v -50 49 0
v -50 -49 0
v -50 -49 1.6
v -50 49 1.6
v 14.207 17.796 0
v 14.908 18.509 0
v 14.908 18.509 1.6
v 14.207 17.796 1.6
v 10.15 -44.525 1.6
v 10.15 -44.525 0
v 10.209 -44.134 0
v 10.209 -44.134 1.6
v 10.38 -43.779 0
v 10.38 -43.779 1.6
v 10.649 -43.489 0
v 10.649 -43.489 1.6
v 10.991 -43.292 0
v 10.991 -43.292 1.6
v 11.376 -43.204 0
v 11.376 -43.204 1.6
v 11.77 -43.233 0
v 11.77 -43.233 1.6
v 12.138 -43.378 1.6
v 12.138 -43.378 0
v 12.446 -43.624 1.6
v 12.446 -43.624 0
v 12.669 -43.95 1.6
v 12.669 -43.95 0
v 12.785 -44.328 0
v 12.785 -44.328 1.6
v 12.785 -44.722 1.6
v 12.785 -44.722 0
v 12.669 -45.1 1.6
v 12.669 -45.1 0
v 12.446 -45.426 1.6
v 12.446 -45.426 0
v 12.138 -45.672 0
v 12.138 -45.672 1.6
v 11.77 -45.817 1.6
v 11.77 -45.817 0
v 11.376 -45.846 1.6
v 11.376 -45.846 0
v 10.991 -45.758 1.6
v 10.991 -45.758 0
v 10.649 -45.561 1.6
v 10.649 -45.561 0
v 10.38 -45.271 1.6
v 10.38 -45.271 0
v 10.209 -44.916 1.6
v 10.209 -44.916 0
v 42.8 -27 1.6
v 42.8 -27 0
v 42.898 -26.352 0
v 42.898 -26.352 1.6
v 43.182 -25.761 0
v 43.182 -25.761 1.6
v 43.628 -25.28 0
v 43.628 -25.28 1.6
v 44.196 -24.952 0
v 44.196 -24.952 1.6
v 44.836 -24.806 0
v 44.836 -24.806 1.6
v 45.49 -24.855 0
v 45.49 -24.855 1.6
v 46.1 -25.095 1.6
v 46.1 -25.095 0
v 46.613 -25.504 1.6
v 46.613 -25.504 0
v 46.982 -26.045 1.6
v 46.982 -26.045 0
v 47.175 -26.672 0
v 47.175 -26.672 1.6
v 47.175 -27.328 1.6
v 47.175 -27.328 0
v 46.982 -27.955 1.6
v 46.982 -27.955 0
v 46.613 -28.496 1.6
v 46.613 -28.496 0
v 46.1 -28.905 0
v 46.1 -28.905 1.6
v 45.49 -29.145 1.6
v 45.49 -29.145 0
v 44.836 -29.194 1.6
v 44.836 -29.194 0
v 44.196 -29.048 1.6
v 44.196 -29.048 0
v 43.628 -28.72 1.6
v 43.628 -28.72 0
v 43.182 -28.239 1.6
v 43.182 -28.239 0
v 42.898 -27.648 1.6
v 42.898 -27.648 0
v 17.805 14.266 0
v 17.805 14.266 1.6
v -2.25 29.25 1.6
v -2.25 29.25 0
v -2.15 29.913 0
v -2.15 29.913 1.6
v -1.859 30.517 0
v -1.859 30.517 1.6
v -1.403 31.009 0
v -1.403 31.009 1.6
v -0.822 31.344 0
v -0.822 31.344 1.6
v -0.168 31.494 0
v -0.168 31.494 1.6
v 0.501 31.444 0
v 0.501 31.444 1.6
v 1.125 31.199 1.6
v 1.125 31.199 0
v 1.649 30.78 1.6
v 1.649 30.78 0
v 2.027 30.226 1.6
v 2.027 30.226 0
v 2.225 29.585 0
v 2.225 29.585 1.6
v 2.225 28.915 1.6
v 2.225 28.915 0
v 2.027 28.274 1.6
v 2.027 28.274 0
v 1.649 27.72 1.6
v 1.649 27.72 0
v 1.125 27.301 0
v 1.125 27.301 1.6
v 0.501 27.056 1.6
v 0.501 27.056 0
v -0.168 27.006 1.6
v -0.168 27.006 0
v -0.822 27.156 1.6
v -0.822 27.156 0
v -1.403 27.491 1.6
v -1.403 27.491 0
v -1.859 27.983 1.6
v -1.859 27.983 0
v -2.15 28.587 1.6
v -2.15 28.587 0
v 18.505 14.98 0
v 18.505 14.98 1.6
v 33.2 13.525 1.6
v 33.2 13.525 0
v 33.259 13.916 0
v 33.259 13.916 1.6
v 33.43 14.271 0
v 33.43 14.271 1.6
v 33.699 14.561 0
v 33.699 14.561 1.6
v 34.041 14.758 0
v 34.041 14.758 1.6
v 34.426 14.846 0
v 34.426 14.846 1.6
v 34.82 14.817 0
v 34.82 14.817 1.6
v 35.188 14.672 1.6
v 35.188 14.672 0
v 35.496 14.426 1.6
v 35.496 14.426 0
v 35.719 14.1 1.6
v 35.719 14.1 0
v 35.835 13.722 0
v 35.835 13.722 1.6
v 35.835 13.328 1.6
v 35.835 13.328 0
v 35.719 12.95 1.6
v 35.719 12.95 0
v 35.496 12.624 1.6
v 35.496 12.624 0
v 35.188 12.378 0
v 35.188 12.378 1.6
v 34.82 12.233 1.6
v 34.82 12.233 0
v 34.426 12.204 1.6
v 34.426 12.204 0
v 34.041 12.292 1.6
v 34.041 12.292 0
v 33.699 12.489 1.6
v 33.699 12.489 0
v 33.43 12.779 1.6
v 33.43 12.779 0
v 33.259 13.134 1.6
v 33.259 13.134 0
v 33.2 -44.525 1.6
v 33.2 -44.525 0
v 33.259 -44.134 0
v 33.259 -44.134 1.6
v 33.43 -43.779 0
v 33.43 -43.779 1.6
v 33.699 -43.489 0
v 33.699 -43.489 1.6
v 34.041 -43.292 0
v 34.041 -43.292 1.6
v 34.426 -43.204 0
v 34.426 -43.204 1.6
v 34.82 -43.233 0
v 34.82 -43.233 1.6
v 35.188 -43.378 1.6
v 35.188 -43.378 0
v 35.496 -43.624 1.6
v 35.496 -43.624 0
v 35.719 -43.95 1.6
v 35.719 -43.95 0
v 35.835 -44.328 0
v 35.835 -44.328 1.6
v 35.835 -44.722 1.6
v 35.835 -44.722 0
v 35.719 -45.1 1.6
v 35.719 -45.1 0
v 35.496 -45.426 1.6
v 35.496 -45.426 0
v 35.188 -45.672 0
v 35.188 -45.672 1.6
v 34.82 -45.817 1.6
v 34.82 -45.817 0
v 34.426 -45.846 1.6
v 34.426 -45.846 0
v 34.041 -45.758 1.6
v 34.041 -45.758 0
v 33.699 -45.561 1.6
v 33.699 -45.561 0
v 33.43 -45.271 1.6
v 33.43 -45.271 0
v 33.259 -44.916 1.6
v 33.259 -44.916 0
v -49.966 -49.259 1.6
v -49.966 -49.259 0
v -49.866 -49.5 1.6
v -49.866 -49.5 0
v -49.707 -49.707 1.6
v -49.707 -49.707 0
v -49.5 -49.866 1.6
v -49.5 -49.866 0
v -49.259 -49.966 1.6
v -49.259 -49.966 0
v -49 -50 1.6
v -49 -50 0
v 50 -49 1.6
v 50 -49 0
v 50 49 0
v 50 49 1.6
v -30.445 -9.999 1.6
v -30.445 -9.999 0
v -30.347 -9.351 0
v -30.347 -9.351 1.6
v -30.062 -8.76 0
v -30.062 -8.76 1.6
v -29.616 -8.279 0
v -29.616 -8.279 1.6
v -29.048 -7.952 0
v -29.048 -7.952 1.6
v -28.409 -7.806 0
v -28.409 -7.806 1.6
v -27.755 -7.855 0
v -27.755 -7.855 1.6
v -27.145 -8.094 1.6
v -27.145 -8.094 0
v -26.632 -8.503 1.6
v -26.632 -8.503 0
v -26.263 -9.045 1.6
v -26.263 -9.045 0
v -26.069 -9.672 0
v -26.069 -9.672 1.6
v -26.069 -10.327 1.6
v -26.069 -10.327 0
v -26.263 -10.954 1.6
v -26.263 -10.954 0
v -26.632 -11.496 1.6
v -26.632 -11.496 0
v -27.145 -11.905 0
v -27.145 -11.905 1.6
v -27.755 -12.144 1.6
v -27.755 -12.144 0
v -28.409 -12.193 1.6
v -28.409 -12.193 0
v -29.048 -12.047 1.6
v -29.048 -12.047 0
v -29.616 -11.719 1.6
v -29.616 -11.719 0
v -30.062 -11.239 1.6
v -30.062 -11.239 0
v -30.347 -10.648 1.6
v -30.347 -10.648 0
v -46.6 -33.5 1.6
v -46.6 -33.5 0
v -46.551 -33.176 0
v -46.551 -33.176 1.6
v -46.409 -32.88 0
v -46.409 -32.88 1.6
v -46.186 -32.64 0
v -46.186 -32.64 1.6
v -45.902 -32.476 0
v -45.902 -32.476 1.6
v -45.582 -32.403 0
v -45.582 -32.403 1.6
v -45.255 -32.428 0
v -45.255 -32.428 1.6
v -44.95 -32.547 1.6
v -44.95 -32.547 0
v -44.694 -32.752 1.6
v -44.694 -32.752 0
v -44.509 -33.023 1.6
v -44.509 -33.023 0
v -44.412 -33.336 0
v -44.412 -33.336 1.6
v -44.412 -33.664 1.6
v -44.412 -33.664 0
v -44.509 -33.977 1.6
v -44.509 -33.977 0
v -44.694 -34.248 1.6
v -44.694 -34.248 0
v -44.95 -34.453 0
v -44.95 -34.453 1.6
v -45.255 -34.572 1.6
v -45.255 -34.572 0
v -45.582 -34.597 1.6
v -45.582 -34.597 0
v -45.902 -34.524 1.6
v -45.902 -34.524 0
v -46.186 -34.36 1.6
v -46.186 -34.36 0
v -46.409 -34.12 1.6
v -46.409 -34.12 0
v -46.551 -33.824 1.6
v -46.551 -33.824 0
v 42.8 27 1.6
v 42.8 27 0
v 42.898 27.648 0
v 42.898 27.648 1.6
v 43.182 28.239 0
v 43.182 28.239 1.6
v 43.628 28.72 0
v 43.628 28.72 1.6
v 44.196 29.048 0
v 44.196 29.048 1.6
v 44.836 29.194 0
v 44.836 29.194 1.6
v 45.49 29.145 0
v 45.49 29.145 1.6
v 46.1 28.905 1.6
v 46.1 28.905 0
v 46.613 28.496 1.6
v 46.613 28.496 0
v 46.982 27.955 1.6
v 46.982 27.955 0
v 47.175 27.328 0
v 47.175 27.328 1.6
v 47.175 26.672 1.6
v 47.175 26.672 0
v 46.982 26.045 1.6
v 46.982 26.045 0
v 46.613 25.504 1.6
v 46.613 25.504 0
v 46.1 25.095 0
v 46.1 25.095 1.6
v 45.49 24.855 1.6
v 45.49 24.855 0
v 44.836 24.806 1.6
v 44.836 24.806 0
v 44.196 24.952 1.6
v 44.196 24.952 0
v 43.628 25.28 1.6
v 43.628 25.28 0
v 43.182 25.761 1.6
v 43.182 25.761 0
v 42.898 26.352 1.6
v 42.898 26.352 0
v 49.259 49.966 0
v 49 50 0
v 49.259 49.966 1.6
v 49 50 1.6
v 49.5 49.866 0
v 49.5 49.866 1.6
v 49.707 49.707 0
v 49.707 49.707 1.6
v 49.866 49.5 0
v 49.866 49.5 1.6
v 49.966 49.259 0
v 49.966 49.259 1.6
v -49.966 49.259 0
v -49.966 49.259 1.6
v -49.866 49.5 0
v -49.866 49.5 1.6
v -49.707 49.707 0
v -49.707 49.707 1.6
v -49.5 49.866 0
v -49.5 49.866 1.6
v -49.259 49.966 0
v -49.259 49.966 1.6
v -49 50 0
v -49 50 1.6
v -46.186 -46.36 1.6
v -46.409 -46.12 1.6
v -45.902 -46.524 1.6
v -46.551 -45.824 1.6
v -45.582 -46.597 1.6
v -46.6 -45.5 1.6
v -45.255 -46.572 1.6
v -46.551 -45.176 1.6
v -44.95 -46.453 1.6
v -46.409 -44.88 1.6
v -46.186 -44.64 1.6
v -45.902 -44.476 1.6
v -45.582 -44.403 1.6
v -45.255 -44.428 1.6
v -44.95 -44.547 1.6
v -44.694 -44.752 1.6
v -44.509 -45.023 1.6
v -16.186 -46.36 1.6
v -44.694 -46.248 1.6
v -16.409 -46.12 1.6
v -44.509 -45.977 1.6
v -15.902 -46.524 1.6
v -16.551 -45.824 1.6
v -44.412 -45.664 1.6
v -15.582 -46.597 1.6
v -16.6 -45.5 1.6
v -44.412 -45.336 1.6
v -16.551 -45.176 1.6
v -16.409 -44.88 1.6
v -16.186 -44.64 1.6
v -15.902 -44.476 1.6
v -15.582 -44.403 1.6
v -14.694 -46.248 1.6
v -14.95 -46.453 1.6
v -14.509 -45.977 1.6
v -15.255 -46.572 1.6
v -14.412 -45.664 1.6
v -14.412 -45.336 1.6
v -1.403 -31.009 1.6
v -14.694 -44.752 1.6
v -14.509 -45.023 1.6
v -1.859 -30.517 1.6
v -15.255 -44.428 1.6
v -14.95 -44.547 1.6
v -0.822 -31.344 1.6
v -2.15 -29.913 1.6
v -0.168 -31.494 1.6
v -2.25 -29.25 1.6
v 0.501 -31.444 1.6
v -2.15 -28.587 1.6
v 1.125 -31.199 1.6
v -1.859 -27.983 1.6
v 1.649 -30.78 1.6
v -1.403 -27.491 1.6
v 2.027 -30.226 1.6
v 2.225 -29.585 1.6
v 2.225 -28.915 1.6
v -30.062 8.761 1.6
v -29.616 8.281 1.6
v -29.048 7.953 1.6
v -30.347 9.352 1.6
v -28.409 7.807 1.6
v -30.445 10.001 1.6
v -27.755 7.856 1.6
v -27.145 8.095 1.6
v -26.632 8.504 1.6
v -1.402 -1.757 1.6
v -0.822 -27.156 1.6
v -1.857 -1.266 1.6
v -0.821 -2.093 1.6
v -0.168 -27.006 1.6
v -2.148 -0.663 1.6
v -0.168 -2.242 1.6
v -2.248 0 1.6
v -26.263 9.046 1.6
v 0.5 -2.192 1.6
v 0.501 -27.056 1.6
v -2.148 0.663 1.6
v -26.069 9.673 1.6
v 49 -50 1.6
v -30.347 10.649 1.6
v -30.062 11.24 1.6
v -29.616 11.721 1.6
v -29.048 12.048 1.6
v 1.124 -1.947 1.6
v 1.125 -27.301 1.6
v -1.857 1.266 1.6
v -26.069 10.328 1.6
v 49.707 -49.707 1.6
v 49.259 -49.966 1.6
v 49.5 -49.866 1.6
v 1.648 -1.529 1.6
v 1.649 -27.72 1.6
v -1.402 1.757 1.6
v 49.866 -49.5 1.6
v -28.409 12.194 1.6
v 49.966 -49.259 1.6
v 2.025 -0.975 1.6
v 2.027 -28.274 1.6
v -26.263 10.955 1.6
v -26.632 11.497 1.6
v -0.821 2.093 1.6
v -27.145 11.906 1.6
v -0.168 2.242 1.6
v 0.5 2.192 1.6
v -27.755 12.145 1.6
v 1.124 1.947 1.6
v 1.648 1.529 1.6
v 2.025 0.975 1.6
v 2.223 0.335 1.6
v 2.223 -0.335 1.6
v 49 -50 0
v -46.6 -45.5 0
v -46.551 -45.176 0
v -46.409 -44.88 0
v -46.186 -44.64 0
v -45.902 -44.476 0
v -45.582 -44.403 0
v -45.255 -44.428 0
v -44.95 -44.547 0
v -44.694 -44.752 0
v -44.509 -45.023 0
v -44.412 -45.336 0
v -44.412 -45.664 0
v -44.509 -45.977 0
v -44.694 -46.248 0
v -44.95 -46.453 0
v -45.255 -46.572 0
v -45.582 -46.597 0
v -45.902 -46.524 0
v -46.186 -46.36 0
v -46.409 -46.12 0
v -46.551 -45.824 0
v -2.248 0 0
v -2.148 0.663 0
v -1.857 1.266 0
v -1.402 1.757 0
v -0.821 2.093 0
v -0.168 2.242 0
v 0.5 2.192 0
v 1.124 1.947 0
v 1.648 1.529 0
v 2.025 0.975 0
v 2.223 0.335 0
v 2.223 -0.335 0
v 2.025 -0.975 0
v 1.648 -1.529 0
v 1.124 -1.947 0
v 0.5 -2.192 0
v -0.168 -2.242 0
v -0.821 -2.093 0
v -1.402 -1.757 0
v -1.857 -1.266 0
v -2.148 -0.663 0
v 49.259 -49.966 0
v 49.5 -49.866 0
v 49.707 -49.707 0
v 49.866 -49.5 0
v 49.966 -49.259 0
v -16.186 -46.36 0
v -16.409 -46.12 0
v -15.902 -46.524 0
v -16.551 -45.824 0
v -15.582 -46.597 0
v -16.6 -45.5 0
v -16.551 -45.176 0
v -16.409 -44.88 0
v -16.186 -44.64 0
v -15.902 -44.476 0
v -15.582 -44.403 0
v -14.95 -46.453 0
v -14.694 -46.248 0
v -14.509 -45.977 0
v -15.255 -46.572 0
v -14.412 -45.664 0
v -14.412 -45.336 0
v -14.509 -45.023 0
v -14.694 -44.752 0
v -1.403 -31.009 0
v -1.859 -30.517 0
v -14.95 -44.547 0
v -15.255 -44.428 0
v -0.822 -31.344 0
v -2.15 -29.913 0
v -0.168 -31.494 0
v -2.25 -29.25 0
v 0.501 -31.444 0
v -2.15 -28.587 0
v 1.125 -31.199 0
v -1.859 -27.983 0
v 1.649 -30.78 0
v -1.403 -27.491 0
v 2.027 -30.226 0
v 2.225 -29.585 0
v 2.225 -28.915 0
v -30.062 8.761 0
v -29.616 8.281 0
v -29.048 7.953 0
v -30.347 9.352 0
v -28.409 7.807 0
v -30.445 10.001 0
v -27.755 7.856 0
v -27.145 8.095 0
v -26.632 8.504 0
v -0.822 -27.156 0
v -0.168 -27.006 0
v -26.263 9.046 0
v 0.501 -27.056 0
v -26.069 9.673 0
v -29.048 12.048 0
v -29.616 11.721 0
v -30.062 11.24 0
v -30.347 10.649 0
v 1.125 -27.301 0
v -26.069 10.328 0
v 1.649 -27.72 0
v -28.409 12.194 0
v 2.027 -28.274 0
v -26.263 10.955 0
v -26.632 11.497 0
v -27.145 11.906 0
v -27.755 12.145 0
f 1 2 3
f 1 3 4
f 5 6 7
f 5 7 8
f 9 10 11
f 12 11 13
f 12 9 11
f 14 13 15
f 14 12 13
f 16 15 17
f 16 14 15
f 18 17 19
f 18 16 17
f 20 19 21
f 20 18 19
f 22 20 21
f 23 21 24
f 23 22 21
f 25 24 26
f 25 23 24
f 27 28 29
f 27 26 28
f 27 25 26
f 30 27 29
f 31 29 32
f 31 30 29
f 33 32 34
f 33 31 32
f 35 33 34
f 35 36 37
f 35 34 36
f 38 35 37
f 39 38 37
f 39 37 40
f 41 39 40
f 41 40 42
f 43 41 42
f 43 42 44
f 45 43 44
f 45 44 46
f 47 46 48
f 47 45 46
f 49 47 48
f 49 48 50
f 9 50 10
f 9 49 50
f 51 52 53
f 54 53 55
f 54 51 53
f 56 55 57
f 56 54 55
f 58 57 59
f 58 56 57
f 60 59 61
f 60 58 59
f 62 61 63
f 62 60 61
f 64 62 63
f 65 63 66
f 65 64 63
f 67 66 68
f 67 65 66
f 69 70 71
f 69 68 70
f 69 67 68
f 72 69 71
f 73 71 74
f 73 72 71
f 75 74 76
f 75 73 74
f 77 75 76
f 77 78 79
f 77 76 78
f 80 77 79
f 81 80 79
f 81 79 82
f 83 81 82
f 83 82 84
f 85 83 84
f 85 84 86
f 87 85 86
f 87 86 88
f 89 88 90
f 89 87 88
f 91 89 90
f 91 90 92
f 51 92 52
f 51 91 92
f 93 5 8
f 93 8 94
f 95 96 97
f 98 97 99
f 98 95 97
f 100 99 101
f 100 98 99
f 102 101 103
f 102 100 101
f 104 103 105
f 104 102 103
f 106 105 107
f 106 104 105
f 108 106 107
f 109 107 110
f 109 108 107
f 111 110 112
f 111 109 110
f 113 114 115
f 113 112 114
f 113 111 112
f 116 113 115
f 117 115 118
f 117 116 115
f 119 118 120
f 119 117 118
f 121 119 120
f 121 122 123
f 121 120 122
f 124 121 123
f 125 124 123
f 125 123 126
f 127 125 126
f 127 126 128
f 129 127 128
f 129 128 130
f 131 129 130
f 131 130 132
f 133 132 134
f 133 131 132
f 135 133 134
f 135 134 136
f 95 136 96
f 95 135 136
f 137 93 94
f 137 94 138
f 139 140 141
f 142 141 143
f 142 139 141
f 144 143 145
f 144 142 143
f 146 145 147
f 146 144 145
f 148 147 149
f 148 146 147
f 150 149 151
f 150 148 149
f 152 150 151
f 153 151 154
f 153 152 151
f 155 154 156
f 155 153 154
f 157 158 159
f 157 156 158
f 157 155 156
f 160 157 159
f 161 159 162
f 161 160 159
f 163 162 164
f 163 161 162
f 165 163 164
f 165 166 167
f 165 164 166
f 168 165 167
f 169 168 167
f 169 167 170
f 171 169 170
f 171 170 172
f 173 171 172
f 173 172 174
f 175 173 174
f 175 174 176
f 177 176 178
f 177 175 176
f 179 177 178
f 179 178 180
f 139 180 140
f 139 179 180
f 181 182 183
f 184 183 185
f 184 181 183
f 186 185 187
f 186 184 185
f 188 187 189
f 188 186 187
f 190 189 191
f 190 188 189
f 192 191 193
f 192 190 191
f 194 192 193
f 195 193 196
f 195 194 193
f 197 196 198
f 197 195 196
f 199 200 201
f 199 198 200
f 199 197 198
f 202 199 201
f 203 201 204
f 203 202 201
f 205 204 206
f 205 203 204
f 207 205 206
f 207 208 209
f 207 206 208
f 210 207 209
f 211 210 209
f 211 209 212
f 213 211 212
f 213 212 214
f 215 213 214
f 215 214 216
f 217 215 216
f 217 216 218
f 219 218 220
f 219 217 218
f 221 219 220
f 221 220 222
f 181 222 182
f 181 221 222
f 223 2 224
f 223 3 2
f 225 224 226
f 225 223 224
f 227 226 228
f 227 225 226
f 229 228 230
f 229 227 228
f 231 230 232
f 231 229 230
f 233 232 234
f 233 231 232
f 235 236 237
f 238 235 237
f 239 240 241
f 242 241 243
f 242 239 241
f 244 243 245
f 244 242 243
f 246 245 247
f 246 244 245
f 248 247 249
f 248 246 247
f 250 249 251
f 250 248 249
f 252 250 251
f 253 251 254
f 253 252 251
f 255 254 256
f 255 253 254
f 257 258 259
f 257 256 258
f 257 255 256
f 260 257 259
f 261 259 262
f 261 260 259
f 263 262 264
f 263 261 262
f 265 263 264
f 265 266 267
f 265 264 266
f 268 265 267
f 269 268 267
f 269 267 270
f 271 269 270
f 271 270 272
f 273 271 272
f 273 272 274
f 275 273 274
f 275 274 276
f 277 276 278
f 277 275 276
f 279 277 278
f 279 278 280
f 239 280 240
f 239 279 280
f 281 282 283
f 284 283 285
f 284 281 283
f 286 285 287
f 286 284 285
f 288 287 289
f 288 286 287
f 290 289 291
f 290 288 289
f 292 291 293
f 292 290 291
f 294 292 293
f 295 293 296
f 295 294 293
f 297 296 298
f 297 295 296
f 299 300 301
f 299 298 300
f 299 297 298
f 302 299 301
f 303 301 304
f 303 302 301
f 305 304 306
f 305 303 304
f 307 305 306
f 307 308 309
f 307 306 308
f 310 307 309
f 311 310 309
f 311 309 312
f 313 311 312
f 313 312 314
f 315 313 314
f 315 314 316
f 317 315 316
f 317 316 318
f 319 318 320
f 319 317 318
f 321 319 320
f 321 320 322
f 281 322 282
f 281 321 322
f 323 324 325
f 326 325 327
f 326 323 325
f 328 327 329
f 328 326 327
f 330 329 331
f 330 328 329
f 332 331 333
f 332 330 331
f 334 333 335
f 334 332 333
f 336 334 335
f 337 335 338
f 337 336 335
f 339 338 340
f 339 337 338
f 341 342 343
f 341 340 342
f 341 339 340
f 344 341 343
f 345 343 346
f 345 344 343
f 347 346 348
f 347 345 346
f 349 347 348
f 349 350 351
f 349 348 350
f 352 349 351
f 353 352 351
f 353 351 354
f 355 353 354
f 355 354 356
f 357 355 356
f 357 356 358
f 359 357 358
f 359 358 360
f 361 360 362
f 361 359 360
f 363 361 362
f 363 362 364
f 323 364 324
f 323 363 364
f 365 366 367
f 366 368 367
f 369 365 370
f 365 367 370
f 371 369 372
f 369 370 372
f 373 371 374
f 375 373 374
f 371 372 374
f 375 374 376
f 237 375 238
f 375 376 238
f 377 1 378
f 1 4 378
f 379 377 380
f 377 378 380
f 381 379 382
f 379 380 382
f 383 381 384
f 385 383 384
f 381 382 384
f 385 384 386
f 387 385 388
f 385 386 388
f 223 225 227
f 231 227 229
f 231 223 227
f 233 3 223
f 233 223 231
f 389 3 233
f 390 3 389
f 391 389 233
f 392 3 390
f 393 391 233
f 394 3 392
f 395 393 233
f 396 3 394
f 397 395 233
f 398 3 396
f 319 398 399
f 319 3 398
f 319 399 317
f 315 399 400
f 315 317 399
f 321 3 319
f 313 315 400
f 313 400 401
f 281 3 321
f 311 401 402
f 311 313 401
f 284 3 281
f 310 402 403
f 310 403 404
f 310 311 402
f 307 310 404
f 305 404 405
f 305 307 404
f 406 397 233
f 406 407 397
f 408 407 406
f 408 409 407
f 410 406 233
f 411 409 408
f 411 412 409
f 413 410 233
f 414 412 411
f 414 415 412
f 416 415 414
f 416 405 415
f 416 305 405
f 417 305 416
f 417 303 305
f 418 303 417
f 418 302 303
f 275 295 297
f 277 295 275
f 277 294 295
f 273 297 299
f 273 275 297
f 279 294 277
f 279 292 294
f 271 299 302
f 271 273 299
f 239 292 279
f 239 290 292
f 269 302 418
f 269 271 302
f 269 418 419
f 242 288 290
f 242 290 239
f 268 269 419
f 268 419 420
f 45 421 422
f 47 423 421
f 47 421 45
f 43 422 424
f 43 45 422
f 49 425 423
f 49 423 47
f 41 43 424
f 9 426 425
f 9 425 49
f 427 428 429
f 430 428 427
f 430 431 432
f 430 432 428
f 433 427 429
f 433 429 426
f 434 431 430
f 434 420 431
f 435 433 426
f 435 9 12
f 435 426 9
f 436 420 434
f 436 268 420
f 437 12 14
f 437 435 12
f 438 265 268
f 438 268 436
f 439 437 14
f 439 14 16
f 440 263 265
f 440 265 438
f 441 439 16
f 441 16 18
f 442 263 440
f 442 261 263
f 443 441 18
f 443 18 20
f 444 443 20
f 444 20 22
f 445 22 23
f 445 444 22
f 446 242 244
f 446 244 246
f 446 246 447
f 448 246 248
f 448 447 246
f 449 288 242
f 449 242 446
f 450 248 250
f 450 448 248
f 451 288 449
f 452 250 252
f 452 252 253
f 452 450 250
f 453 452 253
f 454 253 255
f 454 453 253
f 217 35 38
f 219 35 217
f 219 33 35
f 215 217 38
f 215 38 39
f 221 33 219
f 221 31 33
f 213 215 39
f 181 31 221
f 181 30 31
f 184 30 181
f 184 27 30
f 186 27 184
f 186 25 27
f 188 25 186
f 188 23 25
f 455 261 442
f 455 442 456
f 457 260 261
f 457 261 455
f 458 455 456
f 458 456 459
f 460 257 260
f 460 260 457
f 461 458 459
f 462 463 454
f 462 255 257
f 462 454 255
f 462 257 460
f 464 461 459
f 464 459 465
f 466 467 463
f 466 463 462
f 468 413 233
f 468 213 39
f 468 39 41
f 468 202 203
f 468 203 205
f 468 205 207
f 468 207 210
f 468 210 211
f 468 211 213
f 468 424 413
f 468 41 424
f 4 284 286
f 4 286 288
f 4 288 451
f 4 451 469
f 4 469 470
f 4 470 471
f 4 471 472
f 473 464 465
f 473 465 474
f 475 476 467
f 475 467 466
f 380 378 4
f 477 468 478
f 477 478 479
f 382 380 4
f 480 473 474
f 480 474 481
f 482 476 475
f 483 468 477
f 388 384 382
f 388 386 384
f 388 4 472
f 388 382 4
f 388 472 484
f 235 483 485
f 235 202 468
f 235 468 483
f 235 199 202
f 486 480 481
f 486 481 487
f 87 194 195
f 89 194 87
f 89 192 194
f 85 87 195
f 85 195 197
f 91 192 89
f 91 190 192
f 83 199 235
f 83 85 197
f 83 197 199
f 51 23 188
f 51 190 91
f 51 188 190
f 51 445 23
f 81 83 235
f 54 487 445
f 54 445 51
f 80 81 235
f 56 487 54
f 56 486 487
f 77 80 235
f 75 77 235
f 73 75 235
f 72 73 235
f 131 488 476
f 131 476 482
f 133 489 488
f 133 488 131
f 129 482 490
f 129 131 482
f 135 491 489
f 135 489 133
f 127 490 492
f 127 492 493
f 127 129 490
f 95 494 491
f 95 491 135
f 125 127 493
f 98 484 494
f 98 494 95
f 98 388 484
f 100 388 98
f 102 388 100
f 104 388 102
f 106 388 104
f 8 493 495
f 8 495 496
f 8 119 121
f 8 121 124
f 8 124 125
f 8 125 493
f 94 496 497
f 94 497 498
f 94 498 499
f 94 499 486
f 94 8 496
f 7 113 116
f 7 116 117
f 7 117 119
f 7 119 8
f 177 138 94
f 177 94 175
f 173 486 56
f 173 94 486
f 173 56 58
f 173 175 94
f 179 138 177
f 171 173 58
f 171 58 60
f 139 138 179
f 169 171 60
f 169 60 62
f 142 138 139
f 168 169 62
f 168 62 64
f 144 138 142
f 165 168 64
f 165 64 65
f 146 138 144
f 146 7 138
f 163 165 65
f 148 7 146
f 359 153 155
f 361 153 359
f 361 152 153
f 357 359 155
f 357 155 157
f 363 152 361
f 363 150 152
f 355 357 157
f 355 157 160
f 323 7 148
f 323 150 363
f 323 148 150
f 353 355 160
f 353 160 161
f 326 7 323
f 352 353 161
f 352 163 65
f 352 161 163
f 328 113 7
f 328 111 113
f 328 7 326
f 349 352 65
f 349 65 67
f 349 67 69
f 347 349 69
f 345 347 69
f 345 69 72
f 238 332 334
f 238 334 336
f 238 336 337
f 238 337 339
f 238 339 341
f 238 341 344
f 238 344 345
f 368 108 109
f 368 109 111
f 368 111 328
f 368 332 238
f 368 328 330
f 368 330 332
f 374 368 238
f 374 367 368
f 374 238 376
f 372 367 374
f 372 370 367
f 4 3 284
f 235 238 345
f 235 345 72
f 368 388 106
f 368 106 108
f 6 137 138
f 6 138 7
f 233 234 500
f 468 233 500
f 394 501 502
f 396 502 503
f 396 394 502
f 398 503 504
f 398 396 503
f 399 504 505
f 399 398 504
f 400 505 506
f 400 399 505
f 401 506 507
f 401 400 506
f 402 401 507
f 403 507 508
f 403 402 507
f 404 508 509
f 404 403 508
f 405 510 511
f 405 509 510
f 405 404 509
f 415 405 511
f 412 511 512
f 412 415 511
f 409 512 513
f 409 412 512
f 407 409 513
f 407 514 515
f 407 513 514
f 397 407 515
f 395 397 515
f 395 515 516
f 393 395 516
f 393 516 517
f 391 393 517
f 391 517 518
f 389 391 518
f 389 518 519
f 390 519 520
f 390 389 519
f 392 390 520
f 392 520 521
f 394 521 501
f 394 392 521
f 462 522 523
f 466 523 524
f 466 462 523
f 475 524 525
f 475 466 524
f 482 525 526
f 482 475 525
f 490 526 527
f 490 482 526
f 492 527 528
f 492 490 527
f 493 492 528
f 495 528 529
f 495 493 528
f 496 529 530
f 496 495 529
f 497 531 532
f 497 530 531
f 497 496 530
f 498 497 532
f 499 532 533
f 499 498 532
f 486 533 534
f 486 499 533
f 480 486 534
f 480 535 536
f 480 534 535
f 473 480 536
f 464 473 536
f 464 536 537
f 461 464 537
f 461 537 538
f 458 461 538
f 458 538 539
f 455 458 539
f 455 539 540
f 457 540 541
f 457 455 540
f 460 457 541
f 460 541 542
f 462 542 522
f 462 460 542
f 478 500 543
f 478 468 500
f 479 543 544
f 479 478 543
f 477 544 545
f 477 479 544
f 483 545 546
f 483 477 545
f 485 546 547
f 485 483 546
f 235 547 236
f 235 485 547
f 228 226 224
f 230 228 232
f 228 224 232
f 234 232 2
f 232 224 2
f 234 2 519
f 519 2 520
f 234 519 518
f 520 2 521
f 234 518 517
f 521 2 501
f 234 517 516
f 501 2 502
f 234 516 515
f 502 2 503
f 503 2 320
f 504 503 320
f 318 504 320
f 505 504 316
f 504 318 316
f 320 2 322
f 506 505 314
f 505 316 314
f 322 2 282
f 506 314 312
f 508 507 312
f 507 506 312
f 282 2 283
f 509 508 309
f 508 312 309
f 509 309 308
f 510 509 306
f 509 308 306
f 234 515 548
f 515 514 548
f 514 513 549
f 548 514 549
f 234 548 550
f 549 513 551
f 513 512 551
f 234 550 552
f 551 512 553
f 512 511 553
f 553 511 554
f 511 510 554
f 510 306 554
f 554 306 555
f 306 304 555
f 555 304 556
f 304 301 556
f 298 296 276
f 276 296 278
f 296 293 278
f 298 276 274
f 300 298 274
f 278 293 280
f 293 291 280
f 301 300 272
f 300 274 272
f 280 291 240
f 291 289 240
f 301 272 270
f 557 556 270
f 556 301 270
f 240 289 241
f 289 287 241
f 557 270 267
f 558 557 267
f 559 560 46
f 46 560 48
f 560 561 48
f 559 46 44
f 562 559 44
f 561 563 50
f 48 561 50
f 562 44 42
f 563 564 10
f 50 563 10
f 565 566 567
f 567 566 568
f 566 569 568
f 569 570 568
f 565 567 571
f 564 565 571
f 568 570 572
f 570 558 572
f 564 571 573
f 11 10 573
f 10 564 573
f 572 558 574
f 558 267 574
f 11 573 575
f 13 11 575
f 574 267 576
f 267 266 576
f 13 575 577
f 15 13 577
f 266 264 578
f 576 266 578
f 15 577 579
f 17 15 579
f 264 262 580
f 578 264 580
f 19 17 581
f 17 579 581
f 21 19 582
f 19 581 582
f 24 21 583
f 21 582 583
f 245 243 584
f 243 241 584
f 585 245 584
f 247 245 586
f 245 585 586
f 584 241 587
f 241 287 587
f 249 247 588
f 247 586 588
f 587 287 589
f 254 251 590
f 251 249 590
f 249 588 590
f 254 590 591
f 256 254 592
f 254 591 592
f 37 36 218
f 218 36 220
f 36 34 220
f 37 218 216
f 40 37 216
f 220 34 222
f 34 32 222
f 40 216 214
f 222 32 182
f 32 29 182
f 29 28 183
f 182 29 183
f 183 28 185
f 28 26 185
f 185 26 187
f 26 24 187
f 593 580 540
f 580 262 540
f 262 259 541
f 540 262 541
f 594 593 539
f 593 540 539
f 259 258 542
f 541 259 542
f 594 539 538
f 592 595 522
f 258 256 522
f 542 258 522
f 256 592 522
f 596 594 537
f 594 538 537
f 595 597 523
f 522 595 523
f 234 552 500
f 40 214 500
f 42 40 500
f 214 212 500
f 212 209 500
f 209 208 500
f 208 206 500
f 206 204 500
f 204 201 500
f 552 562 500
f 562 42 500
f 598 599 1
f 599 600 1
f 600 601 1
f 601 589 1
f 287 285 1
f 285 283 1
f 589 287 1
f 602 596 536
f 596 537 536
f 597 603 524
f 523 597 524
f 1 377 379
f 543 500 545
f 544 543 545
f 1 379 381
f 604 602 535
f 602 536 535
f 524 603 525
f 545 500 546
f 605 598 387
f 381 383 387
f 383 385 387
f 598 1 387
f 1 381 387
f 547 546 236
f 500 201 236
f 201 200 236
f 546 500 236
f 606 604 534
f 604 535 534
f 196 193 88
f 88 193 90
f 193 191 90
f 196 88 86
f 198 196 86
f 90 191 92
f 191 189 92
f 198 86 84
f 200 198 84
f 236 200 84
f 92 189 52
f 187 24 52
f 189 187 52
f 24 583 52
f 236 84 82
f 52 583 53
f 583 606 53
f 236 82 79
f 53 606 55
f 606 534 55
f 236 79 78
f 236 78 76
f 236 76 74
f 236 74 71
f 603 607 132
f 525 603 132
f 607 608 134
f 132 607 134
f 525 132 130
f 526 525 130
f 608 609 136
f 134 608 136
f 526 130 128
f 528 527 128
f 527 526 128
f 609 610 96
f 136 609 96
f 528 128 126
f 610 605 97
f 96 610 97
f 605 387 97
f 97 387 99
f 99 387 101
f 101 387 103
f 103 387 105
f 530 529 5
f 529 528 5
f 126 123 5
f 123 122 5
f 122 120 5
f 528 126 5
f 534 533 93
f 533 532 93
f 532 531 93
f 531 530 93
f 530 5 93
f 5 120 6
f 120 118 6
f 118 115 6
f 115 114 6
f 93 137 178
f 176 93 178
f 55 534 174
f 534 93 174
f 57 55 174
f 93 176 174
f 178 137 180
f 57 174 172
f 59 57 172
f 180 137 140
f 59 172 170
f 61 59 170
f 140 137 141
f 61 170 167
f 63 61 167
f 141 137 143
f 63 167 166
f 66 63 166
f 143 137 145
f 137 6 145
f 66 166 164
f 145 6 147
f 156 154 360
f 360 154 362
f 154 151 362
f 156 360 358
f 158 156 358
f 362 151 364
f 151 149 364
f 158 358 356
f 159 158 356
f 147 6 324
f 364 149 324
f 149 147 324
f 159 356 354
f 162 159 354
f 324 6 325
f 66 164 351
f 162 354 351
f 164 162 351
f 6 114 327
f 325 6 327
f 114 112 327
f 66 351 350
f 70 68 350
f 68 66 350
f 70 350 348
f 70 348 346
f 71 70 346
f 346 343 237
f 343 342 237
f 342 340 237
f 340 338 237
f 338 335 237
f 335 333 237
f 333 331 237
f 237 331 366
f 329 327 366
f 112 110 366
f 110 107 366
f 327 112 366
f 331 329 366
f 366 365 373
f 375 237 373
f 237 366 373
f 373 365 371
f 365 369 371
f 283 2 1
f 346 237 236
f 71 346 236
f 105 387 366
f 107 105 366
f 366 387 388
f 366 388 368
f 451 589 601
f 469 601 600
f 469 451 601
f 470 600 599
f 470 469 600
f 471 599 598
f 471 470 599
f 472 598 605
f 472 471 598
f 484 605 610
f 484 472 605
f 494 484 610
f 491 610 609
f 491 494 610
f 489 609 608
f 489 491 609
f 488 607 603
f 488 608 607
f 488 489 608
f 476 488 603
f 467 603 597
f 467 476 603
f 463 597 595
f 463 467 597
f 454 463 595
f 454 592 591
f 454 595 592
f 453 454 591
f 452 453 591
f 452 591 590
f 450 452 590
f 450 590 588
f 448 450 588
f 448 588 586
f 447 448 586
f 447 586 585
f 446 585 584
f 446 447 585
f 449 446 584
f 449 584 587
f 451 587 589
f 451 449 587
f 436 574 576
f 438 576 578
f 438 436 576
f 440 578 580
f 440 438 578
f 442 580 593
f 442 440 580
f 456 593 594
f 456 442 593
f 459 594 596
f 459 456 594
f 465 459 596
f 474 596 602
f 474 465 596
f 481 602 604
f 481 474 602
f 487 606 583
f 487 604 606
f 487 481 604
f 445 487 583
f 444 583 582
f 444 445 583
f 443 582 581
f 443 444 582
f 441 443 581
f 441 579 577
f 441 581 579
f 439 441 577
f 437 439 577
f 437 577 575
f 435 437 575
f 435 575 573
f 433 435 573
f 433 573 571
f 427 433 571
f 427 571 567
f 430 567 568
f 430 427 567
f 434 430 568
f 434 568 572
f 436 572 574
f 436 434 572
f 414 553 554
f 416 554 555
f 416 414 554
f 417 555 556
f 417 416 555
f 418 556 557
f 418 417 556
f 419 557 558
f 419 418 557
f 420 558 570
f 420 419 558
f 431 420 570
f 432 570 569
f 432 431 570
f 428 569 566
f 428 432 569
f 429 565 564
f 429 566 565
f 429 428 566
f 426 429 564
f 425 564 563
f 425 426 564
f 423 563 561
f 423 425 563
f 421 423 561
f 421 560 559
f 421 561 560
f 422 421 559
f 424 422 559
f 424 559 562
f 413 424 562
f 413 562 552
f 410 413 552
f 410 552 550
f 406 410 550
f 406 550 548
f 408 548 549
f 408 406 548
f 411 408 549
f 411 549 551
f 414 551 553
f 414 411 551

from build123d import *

# Parameters (mm, degrees)
SKETCH1_W           = 100
SKETCH1_H           = 100
BOSS_EXTRUDE1_DEPTH = 1.6
SKETCH3_R           = 2.2479
SKETCH3_R_2         = 1.325
SKETCH3_R_3         = 2.25
SKETCH3_R_4         = 2.2
SKETCH3_R_5         = 1.1
CUT_EXTRUDE2_DEPTH  = 2.6
FILLET1_R           = 1
CUT_EXTRUDE4_DEPTH  = 2.6


with BuildPart() as part:
    # Sketch1 → Boss-Extrude1 (new body)
    with BuildSketch(Plane.XY):
        Rectangle(SKETCH1_W, SKETCH1_H)
    extrude(amount=BOSS_EXTRUDE1_DEPTH)

    # Sketch3 → Cut-Extrude2 (cut, through all)
    with BuildSketch(Plane(origin=(0, 0, 1.6), x_dir=(-1, 0, 0), z_dir=(0, 0, -1))):
        Circle(SKETCH3_R)
        with Locations((-34.525, -44.525)):
            Circle(SKETCH3_R_2)
        with Locations((0, -29.25)):
            Circle(SKETCH3_R_3)
        with Locations((-45, -27)):
            Circle(SKETCH3_R_4)
        with Locations((0, 29.25)):
            Circle(SKETCH3_R_3)
        with Locations((-45, 27)):
            Circle(SKETCH3_R_4)
        with Locations((-34.525, 13.525)):
            Circle(SKETCH3_R_2)
        with Locations((15.5, -45.5)):
            Circle(SKETCH3_R_5)
        with Locations((45.5, -45.5)):
            Circle(SKETCH3_R_5)
        with Locations((45.5, -33.5)):
            Circle(SKETCH3_R_5)
        with Locations((-11.475, -44.525)):
            Circle(SKETCH3_R_2)
        with Locations((28.244666378, -9.999429886)):
            Circle(SKETCH3_R_4)
        with Locations((28.244666378, 10.000570114)):
            Circle(SKETCH3_R_4)
    extrude(amount=CUT_EXTRUDE2_DEPTH, mode=Mode.SUBTRACT)

    # Fillet1
    fillet1_edges = [part.edges().sort_by_distance(p)[0] for p in [
        (50, -50, 0.8),
        (-50, -50, 0.8),
        (-50, 50, 0.8),
        (50, 50, 0.8),
    ]]
    fillet(fillet1_edges, radius=FILLET1_R)

    # Sketch5 → Cut-Extrude4 (cut, through all)
    with BuildSketch(Plane(origin=(0, 0, 0), x_dir=(-1, 0, 0), z_dir=(0, 0, -1))):
        Polygon((-14.207463079, 17.79554595), (-17.804907195, 14.265775174), (-18.505268384, 14.979563801), (-14.907824268, 18.509334578), align=None)
    extrude(amount=-CUT_EXTRUDE4_DEPTH, mode=Mode.SUBTRACT)


solid = part.part
